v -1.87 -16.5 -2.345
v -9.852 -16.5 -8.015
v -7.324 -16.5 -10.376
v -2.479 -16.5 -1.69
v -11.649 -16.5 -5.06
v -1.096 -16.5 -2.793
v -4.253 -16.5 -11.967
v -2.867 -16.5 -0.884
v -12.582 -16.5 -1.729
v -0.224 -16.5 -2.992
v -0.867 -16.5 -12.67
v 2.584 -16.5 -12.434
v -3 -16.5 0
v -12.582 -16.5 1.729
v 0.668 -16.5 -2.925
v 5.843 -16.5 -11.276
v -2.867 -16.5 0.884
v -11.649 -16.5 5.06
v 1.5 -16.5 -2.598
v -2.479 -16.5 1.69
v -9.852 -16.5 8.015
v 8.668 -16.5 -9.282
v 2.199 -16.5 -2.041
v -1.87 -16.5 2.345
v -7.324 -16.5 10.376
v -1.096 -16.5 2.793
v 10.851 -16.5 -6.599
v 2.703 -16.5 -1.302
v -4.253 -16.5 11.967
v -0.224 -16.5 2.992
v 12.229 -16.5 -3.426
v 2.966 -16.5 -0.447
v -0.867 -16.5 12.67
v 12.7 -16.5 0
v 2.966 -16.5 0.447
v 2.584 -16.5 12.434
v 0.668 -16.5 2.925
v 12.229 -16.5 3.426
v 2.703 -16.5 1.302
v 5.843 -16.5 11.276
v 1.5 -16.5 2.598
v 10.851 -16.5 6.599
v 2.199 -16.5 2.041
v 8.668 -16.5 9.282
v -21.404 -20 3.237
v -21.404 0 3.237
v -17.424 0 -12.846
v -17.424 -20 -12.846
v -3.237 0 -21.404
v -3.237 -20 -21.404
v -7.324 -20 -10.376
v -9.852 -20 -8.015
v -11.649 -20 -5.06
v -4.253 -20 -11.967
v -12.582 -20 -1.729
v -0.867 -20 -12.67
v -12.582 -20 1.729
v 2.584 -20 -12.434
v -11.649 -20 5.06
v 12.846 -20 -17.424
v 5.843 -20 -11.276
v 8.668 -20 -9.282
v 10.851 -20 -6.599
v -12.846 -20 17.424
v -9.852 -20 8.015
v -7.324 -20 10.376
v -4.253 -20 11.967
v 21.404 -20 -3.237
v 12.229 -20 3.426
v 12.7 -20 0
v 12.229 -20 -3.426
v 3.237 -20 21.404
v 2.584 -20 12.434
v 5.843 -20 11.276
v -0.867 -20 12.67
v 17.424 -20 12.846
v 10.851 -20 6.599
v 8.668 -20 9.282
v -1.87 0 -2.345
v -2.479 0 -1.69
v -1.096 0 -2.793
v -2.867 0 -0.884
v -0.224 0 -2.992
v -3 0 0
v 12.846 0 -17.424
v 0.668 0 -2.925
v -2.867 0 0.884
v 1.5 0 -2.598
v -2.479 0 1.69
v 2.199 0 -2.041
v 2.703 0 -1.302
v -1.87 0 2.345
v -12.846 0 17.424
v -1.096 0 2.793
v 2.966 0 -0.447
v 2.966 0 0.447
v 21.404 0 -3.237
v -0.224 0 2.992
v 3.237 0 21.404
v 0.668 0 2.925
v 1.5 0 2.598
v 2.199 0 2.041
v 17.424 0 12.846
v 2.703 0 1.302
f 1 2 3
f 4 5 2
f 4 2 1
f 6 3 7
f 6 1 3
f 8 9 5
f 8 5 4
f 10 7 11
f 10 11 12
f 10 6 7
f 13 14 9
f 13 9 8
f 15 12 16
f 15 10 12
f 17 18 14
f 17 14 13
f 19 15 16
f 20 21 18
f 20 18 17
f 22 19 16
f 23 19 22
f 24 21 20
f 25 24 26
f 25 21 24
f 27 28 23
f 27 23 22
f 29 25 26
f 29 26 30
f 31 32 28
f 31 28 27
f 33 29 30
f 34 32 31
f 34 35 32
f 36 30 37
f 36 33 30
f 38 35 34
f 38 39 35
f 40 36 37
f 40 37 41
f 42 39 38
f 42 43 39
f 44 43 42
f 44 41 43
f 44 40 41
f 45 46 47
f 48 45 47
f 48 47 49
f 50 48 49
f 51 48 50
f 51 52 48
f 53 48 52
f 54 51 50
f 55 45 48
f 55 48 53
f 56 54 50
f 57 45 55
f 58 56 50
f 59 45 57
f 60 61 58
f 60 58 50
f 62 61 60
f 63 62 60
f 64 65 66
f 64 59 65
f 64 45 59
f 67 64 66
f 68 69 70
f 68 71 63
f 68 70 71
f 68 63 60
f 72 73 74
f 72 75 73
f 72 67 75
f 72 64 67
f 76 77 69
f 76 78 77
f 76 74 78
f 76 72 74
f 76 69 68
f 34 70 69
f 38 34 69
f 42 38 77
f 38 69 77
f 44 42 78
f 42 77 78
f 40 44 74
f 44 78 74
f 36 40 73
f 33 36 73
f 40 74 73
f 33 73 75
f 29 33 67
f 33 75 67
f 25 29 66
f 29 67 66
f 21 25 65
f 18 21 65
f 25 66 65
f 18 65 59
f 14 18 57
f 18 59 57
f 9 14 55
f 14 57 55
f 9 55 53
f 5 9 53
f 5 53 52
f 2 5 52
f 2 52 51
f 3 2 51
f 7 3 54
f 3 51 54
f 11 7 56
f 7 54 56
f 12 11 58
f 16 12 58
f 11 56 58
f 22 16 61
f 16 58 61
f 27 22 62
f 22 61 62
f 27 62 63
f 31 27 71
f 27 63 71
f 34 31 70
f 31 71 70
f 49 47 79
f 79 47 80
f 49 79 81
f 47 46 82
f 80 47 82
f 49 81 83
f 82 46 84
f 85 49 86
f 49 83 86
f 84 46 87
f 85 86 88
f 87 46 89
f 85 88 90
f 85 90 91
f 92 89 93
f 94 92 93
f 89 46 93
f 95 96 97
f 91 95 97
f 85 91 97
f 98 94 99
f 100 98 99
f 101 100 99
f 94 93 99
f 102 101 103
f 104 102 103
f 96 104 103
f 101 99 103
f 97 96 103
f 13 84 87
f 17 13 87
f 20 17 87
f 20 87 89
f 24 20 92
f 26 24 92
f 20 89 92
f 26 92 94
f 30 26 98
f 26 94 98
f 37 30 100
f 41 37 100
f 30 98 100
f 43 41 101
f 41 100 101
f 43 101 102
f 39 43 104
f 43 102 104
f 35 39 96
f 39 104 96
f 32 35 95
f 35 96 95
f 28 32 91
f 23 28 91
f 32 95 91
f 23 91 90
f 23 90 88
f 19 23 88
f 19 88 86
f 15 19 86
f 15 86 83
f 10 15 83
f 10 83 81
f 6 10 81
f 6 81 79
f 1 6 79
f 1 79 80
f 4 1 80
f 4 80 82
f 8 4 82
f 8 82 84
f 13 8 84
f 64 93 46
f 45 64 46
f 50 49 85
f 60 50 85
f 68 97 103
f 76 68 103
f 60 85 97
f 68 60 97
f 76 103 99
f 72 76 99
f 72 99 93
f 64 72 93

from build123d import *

# Parameters (mm, degrees)
F1_DEPTH = 20
F2_R     = 12.7
F3_DEPTH = 3.5
F5_D     = 6


with BuildPart() as f1:
    # F0 (on Front) → F1 (new body)
    with BuildSketch(Plane.XZ):
        Polygon((17.424202, 12.846258), (3.237095, 21.404447), (-12.846258, 17.424202), (-21.404447, 3.237095), (-17.424202, -12.846258), (-3.237095, -21.404447), (12.846258, -17.424202), (21.404447, -3.237095), align=None)
    extrude(amount=F1_DEPTH)

    # F2 (on face) → F3 (cut)
    with BuildSketch(Plane.XZ.offset(20)):
        Circle(F2_R)
    extrude(amount=-F3_DEPTH, mode=Mode.SUBTRACT)

    # F5 (through all)
    with Locations(Plane.XZ.offset(16.5)):
        with Locations((0, 0)):
            Hole(F5_D / 2)


solid = f1.part
